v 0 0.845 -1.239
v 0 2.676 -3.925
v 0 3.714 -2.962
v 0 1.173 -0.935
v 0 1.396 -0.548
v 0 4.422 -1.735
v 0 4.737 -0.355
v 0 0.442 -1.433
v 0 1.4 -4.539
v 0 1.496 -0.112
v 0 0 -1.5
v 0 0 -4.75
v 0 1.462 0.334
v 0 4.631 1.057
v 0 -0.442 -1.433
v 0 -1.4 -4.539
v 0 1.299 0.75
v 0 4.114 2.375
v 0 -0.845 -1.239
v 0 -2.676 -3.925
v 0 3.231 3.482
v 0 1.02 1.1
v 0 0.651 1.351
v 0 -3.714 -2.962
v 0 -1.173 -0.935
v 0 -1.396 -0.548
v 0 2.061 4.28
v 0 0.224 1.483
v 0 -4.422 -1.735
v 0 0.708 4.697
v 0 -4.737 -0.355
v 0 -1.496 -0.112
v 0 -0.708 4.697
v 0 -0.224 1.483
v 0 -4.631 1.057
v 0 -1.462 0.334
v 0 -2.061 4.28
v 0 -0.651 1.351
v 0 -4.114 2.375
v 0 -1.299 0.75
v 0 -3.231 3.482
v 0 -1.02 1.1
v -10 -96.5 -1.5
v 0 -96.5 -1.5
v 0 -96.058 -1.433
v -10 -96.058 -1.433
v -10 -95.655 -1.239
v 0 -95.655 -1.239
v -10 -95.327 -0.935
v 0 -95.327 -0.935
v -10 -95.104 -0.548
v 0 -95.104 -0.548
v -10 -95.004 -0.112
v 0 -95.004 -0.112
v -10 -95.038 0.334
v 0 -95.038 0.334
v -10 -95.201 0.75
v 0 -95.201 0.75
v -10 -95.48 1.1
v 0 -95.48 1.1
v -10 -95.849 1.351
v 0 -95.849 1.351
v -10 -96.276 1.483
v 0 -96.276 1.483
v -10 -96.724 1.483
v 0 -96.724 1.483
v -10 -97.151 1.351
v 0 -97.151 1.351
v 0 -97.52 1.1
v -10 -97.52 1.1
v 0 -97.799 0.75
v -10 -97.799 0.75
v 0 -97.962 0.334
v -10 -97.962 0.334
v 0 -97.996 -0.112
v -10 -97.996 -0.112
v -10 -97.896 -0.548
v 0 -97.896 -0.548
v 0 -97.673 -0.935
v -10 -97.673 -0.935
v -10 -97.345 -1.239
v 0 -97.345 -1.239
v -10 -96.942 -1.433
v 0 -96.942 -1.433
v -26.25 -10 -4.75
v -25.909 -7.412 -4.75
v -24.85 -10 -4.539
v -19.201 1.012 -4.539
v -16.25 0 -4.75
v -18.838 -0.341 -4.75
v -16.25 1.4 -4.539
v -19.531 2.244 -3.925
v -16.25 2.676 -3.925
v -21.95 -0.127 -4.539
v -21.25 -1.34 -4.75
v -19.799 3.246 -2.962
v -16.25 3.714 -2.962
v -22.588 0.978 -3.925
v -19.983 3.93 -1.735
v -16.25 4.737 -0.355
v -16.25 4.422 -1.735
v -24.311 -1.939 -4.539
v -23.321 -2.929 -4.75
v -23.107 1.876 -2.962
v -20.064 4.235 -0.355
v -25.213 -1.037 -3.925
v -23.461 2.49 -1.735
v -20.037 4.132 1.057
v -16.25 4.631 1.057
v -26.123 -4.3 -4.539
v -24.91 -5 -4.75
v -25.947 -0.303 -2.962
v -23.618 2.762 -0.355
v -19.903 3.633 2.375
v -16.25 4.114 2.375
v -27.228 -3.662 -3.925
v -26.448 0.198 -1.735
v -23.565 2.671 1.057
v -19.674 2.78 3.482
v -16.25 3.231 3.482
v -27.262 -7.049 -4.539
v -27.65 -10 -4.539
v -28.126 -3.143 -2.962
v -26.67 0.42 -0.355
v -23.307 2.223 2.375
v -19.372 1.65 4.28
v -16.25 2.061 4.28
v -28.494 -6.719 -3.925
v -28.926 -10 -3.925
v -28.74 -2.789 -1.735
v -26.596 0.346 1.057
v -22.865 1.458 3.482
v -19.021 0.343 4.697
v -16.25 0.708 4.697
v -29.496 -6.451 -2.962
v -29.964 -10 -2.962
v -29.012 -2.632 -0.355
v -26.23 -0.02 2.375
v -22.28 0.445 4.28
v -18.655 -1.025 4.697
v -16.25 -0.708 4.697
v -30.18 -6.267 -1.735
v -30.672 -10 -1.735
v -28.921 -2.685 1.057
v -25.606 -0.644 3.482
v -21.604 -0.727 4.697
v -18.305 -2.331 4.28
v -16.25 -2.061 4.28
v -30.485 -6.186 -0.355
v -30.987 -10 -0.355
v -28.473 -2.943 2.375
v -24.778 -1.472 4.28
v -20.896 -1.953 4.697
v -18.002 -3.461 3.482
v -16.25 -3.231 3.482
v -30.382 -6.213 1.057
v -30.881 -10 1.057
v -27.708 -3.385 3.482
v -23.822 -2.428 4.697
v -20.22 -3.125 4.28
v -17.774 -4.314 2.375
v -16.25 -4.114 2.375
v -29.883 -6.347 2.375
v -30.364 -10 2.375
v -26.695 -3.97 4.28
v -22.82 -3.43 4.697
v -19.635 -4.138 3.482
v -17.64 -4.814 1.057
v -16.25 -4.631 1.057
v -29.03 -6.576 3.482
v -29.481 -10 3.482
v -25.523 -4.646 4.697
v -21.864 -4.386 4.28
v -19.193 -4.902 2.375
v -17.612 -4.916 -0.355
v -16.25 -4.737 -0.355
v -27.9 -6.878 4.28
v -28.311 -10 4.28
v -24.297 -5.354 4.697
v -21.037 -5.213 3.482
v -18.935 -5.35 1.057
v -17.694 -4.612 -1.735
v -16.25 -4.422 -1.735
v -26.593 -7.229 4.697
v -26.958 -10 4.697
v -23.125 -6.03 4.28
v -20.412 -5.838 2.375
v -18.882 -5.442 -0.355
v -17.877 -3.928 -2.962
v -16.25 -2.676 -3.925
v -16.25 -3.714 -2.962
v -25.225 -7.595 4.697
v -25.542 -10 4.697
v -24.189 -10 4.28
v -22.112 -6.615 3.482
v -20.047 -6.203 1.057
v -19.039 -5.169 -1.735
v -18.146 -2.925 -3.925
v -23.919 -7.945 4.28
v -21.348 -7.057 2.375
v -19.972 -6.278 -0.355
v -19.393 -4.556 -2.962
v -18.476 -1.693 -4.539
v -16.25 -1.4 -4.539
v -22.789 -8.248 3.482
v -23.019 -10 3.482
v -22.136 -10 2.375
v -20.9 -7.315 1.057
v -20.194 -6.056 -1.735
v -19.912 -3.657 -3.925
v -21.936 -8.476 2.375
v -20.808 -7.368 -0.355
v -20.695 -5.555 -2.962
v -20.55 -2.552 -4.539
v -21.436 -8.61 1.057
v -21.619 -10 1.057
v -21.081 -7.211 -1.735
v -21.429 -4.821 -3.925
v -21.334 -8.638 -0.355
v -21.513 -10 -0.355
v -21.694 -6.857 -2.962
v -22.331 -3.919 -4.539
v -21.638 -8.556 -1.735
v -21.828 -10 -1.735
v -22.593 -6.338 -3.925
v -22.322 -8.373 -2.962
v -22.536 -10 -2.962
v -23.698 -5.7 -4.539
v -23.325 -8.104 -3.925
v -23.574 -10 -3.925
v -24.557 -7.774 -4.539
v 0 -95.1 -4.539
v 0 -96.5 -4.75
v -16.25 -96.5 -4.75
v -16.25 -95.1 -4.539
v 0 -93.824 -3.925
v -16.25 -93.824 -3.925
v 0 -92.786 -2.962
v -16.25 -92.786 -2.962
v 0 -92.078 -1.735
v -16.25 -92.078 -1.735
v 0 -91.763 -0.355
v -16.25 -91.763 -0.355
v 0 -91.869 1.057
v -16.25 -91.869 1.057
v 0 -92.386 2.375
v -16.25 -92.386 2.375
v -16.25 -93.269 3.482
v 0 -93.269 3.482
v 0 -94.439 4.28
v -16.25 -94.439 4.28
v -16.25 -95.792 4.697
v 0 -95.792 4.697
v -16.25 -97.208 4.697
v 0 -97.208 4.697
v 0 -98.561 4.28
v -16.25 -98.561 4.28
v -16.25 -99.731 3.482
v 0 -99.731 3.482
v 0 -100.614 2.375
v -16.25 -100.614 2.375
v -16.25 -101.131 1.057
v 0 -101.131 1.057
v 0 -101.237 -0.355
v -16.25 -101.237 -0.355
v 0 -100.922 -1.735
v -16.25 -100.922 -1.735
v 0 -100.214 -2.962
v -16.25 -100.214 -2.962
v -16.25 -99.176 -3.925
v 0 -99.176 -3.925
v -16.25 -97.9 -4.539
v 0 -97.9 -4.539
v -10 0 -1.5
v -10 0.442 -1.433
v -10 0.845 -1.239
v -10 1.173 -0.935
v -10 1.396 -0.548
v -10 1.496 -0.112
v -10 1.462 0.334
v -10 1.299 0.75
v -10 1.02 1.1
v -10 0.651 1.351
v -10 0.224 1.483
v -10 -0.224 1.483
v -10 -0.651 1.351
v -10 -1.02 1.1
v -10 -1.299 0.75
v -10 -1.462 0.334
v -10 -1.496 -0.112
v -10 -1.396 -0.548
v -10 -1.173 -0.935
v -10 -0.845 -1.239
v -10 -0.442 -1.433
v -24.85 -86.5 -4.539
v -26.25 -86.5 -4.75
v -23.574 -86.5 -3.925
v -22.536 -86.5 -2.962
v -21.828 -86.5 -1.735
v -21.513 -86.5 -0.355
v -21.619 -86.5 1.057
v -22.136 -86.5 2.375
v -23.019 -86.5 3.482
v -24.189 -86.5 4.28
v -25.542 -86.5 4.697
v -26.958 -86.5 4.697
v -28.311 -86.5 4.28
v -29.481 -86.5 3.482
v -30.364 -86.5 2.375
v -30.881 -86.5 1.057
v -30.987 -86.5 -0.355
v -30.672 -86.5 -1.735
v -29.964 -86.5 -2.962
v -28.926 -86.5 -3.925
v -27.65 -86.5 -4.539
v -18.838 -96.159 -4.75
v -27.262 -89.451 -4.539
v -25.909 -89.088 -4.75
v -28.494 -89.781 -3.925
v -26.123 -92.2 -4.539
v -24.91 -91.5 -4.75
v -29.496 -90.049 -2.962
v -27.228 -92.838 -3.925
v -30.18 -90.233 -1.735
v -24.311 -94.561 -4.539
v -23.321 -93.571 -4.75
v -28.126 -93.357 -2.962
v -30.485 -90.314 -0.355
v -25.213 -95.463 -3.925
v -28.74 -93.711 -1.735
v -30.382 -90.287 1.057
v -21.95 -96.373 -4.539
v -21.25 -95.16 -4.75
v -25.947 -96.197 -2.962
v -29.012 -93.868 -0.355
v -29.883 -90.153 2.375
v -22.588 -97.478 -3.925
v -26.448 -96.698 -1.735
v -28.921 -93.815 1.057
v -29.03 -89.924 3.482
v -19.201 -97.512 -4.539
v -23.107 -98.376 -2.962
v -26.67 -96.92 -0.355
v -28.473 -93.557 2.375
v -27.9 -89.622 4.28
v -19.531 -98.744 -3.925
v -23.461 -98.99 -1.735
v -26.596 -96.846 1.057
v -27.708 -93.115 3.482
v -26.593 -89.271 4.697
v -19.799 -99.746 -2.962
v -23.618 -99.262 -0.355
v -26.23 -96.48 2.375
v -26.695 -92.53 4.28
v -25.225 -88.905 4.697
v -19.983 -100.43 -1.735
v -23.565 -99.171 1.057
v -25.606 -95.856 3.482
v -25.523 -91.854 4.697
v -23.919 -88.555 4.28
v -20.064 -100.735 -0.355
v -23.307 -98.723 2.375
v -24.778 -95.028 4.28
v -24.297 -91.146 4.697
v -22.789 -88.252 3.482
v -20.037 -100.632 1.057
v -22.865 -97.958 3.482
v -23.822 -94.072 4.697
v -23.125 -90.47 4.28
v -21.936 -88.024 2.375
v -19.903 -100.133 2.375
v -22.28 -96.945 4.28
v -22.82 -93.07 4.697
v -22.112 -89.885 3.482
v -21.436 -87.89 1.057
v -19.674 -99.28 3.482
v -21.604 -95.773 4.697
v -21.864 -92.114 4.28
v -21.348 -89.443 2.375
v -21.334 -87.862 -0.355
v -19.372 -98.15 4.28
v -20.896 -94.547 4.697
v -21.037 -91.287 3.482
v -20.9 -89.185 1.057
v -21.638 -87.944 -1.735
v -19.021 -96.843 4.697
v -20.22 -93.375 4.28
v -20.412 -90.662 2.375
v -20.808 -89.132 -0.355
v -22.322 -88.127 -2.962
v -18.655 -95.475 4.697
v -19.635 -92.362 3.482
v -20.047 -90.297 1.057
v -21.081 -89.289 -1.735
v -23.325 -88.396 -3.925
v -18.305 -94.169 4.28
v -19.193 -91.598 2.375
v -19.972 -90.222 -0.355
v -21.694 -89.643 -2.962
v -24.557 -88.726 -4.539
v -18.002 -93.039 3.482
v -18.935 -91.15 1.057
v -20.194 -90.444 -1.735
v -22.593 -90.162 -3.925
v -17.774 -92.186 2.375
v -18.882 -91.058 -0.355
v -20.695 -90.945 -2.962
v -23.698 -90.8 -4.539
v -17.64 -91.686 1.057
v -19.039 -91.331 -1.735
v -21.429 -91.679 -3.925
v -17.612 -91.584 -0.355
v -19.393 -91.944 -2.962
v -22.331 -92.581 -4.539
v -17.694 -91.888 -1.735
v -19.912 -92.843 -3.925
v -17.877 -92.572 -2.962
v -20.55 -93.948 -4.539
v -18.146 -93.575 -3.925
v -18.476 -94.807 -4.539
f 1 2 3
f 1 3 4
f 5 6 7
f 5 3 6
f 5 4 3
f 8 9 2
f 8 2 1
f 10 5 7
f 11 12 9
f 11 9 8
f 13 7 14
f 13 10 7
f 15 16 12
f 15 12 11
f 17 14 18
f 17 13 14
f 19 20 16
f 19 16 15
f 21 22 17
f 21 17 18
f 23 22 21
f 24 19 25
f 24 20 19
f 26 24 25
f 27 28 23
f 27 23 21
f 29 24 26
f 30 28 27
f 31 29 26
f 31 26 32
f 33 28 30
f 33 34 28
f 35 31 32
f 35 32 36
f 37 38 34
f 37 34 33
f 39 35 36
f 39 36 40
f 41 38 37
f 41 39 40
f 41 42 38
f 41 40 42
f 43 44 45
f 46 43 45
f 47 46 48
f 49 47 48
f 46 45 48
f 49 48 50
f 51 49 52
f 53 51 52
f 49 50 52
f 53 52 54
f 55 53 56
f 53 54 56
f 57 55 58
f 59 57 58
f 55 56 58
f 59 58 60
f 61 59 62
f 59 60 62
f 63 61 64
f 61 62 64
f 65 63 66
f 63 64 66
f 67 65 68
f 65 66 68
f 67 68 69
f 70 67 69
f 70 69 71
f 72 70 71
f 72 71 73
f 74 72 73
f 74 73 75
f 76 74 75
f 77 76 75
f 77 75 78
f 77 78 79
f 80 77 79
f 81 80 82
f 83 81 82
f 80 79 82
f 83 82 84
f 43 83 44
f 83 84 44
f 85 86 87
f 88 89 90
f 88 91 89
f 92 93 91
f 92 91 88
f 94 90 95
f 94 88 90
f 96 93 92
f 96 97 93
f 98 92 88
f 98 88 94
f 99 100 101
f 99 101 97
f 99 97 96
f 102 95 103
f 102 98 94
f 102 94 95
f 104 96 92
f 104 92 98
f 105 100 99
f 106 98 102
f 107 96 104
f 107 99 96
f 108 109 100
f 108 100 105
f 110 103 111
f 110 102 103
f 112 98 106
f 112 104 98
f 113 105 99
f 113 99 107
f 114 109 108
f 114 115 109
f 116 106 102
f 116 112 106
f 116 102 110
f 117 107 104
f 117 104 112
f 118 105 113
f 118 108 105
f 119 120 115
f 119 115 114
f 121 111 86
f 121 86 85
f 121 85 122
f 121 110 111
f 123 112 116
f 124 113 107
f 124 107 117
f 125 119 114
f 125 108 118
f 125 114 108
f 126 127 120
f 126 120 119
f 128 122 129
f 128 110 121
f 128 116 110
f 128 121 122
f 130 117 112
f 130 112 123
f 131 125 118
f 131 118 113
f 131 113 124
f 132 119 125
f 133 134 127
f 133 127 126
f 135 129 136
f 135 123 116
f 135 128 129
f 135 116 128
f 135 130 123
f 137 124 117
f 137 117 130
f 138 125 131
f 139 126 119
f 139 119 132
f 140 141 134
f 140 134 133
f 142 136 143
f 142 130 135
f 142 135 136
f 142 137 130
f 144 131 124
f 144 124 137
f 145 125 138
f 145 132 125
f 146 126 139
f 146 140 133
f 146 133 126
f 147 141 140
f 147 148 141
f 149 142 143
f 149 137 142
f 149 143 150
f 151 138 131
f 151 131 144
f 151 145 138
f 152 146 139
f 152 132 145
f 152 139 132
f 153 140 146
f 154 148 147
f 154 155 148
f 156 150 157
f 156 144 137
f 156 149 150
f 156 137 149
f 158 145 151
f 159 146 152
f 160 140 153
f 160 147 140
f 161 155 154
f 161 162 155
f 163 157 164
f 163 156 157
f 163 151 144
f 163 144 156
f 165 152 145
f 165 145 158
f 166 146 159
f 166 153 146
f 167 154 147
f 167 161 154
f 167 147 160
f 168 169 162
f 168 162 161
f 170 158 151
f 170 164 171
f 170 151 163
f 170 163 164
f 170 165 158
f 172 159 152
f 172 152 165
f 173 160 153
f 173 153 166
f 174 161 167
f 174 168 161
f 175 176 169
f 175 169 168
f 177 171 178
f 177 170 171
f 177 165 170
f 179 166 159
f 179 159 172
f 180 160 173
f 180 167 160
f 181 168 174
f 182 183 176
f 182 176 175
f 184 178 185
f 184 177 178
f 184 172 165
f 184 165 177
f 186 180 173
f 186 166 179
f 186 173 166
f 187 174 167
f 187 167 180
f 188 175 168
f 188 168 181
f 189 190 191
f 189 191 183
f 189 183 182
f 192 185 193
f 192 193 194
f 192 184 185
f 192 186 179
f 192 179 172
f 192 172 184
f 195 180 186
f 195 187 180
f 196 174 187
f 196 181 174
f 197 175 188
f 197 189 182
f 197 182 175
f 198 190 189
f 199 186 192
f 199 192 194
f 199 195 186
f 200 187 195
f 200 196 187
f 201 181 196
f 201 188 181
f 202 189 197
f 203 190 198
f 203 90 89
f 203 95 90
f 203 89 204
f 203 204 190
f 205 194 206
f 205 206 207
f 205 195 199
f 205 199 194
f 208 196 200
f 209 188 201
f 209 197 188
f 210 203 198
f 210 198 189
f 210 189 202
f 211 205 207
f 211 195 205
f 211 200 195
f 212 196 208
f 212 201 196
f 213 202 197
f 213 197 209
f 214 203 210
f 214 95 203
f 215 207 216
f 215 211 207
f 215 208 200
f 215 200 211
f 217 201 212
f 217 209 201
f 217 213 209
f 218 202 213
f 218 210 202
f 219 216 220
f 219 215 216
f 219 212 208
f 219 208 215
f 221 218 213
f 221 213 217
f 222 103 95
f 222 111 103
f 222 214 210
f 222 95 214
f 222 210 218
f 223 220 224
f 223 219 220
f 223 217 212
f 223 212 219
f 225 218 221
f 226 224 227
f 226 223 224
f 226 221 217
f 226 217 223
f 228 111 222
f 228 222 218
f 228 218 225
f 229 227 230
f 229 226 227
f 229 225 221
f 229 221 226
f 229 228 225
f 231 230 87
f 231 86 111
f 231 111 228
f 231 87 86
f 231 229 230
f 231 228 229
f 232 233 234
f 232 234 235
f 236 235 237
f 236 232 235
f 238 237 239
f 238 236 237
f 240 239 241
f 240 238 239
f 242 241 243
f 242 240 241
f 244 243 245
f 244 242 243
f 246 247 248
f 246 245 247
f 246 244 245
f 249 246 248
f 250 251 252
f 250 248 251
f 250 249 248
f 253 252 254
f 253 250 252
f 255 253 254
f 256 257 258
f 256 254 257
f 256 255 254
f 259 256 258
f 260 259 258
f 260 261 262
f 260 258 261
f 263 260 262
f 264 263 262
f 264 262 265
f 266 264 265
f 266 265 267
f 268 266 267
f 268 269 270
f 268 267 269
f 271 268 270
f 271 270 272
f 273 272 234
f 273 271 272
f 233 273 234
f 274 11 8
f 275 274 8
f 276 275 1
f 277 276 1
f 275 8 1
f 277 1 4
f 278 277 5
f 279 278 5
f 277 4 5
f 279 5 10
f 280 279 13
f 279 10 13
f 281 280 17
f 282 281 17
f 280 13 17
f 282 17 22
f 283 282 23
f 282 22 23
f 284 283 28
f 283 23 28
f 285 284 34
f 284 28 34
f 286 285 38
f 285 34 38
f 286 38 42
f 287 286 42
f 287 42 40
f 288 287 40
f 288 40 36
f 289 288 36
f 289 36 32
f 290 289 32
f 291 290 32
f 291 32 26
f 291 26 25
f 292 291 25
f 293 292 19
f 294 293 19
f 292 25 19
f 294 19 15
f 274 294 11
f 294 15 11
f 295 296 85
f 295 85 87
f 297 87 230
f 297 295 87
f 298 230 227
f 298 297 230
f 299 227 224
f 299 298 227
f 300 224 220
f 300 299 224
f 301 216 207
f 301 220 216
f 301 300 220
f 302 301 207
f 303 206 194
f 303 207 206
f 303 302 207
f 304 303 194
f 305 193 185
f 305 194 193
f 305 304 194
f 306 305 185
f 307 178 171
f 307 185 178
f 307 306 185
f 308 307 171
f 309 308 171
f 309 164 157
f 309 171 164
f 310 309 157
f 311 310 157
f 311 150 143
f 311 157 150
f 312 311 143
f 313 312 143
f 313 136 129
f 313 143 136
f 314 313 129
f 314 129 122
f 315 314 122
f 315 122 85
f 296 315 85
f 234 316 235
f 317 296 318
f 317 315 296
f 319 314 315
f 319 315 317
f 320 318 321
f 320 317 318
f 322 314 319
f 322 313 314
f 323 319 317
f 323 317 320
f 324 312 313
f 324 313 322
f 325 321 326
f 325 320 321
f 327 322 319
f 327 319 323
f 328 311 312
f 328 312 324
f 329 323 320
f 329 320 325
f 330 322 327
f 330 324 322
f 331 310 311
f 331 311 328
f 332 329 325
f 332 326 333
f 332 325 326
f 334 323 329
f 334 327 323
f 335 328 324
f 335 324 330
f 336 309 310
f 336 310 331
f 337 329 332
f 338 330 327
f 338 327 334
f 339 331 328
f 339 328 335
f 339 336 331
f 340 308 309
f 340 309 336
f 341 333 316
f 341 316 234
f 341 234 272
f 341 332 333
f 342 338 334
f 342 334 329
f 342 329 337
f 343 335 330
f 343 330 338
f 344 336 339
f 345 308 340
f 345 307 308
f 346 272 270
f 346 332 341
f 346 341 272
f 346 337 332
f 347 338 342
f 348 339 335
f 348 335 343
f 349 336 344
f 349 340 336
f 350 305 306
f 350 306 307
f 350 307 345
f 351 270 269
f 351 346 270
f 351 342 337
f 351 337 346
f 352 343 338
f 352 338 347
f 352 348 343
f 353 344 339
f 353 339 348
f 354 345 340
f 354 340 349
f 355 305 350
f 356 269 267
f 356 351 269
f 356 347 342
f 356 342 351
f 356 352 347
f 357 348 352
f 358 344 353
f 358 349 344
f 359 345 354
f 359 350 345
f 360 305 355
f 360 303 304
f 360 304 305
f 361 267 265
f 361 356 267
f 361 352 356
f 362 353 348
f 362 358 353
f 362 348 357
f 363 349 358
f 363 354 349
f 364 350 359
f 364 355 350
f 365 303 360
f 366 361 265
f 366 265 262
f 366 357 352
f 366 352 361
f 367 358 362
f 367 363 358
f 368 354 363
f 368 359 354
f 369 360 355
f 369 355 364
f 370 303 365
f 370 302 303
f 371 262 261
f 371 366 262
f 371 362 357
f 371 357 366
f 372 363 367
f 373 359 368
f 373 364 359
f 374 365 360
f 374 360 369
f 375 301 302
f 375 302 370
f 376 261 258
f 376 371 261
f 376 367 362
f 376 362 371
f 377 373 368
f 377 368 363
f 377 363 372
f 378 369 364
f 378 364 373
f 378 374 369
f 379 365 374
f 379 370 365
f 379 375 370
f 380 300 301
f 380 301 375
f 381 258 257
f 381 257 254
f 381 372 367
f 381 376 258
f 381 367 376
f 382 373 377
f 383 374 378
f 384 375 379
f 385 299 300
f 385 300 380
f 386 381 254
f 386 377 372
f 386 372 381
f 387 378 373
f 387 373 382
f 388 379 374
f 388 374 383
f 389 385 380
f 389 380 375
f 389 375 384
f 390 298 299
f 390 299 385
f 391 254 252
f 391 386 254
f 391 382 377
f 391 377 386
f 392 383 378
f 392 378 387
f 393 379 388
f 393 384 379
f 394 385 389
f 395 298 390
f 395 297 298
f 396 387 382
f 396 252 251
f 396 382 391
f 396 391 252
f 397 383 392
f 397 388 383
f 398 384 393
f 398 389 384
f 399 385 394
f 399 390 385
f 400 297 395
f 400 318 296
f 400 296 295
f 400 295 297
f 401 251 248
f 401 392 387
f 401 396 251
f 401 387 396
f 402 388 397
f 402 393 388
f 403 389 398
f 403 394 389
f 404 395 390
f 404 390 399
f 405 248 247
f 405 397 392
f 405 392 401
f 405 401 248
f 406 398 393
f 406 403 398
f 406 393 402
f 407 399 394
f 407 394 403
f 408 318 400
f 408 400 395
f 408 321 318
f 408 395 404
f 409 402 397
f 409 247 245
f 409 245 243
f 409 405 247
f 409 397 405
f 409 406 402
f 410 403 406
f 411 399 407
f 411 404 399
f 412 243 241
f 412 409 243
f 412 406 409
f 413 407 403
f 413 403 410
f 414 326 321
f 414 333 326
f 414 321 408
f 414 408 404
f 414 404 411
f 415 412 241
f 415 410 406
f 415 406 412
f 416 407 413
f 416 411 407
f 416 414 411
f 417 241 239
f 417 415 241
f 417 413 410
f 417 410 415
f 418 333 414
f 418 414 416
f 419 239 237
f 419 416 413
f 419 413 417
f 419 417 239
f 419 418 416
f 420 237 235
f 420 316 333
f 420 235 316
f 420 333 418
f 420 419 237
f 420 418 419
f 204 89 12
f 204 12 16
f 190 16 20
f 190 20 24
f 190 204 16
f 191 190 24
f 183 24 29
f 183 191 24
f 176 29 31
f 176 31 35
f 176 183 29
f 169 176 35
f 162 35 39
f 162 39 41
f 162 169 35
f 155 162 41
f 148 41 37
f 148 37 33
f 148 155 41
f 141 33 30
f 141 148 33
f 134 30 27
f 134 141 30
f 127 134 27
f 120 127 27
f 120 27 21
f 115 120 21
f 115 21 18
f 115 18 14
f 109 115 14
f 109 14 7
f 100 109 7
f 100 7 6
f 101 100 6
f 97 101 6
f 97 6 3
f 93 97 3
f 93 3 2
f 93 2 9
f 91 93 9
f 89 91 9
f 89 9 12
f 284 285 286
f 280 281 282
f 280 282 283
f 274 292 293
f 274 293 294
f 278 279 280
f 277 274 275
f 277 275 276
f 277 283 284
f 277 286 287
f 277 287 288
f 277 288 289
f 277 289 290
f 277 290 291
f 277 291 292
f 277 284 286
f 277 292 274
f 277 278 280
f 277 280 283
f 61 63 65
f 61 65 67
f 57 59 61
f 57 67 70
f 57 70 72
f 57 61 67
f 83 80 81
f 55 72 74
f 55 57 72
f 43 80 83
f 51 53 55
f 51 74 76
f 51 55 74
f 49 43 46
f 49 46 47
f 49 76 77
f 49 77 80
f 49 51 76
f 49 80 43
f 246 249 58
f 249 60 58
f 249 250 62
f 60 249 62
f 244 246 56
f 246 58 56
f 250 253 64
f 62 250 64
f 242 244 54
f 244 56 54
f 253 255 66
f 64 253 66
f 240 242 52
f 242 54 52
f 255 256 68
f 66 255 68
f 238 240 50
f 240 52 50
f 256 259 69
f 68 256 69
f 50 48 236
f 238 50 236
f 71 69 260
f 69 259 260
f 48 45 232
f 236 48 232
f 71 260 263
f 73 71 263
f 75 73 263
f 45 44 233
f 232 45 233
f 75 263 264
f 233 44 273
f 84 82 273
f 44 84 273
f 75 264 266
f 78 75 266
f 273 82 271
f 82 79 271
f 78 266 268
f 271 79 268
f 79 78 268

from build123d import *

# Parameters (mm, degrees)
ESBO_O2_R             = 4.75
ESBO_O3_R             = 1.5
CORTE_EXTRUS_O1_DEPTH = 10


with BuildPart() as part:
    # Varredura1: sweep along a path in Esboço1
    with BuildLine(Plane.XY) as varredura1_path:
        Line((0, 0), (-16.25, 0))
        ThreePointArc((-16.25, 0), (-23.321067812, -2.928932188), (-26.25, -10))
        Line((-26.25, -10), (-26.25, -86.5))
        ThreePointArc((-26.25, -86.5), (-23.321067812, -93.571067812), (-16.25, -96.5))
        Line((-16.25, -96.5), (0, -96.5))
    # Esboço2 → Varredura1 (sweep)
    with BuildSketch(Plane(origin=(0, 0, 0), x_dir=(0, 0, -1), z_dir=(1, 0, 0))):
        Circle(ESBO_O2_R)
    sweep(path=varredura1_path.line)

    # Esboço3 → Corte-extrusão1 (cut)
    with BuildSketch(Plane(origin=(0, 0, 0), x_dir=(0, 0, -1), z_dir=(1, 0, 0))):
        Circle(ESBO_O3_R)
        with Locations((0, -96.5)):
            Circle(ESBO_O3_R)
    extrude(amount=-CORTE_EXTRUS_O1_DEPTH, mode=Mode.SUBTRACT)


solid = part.part
